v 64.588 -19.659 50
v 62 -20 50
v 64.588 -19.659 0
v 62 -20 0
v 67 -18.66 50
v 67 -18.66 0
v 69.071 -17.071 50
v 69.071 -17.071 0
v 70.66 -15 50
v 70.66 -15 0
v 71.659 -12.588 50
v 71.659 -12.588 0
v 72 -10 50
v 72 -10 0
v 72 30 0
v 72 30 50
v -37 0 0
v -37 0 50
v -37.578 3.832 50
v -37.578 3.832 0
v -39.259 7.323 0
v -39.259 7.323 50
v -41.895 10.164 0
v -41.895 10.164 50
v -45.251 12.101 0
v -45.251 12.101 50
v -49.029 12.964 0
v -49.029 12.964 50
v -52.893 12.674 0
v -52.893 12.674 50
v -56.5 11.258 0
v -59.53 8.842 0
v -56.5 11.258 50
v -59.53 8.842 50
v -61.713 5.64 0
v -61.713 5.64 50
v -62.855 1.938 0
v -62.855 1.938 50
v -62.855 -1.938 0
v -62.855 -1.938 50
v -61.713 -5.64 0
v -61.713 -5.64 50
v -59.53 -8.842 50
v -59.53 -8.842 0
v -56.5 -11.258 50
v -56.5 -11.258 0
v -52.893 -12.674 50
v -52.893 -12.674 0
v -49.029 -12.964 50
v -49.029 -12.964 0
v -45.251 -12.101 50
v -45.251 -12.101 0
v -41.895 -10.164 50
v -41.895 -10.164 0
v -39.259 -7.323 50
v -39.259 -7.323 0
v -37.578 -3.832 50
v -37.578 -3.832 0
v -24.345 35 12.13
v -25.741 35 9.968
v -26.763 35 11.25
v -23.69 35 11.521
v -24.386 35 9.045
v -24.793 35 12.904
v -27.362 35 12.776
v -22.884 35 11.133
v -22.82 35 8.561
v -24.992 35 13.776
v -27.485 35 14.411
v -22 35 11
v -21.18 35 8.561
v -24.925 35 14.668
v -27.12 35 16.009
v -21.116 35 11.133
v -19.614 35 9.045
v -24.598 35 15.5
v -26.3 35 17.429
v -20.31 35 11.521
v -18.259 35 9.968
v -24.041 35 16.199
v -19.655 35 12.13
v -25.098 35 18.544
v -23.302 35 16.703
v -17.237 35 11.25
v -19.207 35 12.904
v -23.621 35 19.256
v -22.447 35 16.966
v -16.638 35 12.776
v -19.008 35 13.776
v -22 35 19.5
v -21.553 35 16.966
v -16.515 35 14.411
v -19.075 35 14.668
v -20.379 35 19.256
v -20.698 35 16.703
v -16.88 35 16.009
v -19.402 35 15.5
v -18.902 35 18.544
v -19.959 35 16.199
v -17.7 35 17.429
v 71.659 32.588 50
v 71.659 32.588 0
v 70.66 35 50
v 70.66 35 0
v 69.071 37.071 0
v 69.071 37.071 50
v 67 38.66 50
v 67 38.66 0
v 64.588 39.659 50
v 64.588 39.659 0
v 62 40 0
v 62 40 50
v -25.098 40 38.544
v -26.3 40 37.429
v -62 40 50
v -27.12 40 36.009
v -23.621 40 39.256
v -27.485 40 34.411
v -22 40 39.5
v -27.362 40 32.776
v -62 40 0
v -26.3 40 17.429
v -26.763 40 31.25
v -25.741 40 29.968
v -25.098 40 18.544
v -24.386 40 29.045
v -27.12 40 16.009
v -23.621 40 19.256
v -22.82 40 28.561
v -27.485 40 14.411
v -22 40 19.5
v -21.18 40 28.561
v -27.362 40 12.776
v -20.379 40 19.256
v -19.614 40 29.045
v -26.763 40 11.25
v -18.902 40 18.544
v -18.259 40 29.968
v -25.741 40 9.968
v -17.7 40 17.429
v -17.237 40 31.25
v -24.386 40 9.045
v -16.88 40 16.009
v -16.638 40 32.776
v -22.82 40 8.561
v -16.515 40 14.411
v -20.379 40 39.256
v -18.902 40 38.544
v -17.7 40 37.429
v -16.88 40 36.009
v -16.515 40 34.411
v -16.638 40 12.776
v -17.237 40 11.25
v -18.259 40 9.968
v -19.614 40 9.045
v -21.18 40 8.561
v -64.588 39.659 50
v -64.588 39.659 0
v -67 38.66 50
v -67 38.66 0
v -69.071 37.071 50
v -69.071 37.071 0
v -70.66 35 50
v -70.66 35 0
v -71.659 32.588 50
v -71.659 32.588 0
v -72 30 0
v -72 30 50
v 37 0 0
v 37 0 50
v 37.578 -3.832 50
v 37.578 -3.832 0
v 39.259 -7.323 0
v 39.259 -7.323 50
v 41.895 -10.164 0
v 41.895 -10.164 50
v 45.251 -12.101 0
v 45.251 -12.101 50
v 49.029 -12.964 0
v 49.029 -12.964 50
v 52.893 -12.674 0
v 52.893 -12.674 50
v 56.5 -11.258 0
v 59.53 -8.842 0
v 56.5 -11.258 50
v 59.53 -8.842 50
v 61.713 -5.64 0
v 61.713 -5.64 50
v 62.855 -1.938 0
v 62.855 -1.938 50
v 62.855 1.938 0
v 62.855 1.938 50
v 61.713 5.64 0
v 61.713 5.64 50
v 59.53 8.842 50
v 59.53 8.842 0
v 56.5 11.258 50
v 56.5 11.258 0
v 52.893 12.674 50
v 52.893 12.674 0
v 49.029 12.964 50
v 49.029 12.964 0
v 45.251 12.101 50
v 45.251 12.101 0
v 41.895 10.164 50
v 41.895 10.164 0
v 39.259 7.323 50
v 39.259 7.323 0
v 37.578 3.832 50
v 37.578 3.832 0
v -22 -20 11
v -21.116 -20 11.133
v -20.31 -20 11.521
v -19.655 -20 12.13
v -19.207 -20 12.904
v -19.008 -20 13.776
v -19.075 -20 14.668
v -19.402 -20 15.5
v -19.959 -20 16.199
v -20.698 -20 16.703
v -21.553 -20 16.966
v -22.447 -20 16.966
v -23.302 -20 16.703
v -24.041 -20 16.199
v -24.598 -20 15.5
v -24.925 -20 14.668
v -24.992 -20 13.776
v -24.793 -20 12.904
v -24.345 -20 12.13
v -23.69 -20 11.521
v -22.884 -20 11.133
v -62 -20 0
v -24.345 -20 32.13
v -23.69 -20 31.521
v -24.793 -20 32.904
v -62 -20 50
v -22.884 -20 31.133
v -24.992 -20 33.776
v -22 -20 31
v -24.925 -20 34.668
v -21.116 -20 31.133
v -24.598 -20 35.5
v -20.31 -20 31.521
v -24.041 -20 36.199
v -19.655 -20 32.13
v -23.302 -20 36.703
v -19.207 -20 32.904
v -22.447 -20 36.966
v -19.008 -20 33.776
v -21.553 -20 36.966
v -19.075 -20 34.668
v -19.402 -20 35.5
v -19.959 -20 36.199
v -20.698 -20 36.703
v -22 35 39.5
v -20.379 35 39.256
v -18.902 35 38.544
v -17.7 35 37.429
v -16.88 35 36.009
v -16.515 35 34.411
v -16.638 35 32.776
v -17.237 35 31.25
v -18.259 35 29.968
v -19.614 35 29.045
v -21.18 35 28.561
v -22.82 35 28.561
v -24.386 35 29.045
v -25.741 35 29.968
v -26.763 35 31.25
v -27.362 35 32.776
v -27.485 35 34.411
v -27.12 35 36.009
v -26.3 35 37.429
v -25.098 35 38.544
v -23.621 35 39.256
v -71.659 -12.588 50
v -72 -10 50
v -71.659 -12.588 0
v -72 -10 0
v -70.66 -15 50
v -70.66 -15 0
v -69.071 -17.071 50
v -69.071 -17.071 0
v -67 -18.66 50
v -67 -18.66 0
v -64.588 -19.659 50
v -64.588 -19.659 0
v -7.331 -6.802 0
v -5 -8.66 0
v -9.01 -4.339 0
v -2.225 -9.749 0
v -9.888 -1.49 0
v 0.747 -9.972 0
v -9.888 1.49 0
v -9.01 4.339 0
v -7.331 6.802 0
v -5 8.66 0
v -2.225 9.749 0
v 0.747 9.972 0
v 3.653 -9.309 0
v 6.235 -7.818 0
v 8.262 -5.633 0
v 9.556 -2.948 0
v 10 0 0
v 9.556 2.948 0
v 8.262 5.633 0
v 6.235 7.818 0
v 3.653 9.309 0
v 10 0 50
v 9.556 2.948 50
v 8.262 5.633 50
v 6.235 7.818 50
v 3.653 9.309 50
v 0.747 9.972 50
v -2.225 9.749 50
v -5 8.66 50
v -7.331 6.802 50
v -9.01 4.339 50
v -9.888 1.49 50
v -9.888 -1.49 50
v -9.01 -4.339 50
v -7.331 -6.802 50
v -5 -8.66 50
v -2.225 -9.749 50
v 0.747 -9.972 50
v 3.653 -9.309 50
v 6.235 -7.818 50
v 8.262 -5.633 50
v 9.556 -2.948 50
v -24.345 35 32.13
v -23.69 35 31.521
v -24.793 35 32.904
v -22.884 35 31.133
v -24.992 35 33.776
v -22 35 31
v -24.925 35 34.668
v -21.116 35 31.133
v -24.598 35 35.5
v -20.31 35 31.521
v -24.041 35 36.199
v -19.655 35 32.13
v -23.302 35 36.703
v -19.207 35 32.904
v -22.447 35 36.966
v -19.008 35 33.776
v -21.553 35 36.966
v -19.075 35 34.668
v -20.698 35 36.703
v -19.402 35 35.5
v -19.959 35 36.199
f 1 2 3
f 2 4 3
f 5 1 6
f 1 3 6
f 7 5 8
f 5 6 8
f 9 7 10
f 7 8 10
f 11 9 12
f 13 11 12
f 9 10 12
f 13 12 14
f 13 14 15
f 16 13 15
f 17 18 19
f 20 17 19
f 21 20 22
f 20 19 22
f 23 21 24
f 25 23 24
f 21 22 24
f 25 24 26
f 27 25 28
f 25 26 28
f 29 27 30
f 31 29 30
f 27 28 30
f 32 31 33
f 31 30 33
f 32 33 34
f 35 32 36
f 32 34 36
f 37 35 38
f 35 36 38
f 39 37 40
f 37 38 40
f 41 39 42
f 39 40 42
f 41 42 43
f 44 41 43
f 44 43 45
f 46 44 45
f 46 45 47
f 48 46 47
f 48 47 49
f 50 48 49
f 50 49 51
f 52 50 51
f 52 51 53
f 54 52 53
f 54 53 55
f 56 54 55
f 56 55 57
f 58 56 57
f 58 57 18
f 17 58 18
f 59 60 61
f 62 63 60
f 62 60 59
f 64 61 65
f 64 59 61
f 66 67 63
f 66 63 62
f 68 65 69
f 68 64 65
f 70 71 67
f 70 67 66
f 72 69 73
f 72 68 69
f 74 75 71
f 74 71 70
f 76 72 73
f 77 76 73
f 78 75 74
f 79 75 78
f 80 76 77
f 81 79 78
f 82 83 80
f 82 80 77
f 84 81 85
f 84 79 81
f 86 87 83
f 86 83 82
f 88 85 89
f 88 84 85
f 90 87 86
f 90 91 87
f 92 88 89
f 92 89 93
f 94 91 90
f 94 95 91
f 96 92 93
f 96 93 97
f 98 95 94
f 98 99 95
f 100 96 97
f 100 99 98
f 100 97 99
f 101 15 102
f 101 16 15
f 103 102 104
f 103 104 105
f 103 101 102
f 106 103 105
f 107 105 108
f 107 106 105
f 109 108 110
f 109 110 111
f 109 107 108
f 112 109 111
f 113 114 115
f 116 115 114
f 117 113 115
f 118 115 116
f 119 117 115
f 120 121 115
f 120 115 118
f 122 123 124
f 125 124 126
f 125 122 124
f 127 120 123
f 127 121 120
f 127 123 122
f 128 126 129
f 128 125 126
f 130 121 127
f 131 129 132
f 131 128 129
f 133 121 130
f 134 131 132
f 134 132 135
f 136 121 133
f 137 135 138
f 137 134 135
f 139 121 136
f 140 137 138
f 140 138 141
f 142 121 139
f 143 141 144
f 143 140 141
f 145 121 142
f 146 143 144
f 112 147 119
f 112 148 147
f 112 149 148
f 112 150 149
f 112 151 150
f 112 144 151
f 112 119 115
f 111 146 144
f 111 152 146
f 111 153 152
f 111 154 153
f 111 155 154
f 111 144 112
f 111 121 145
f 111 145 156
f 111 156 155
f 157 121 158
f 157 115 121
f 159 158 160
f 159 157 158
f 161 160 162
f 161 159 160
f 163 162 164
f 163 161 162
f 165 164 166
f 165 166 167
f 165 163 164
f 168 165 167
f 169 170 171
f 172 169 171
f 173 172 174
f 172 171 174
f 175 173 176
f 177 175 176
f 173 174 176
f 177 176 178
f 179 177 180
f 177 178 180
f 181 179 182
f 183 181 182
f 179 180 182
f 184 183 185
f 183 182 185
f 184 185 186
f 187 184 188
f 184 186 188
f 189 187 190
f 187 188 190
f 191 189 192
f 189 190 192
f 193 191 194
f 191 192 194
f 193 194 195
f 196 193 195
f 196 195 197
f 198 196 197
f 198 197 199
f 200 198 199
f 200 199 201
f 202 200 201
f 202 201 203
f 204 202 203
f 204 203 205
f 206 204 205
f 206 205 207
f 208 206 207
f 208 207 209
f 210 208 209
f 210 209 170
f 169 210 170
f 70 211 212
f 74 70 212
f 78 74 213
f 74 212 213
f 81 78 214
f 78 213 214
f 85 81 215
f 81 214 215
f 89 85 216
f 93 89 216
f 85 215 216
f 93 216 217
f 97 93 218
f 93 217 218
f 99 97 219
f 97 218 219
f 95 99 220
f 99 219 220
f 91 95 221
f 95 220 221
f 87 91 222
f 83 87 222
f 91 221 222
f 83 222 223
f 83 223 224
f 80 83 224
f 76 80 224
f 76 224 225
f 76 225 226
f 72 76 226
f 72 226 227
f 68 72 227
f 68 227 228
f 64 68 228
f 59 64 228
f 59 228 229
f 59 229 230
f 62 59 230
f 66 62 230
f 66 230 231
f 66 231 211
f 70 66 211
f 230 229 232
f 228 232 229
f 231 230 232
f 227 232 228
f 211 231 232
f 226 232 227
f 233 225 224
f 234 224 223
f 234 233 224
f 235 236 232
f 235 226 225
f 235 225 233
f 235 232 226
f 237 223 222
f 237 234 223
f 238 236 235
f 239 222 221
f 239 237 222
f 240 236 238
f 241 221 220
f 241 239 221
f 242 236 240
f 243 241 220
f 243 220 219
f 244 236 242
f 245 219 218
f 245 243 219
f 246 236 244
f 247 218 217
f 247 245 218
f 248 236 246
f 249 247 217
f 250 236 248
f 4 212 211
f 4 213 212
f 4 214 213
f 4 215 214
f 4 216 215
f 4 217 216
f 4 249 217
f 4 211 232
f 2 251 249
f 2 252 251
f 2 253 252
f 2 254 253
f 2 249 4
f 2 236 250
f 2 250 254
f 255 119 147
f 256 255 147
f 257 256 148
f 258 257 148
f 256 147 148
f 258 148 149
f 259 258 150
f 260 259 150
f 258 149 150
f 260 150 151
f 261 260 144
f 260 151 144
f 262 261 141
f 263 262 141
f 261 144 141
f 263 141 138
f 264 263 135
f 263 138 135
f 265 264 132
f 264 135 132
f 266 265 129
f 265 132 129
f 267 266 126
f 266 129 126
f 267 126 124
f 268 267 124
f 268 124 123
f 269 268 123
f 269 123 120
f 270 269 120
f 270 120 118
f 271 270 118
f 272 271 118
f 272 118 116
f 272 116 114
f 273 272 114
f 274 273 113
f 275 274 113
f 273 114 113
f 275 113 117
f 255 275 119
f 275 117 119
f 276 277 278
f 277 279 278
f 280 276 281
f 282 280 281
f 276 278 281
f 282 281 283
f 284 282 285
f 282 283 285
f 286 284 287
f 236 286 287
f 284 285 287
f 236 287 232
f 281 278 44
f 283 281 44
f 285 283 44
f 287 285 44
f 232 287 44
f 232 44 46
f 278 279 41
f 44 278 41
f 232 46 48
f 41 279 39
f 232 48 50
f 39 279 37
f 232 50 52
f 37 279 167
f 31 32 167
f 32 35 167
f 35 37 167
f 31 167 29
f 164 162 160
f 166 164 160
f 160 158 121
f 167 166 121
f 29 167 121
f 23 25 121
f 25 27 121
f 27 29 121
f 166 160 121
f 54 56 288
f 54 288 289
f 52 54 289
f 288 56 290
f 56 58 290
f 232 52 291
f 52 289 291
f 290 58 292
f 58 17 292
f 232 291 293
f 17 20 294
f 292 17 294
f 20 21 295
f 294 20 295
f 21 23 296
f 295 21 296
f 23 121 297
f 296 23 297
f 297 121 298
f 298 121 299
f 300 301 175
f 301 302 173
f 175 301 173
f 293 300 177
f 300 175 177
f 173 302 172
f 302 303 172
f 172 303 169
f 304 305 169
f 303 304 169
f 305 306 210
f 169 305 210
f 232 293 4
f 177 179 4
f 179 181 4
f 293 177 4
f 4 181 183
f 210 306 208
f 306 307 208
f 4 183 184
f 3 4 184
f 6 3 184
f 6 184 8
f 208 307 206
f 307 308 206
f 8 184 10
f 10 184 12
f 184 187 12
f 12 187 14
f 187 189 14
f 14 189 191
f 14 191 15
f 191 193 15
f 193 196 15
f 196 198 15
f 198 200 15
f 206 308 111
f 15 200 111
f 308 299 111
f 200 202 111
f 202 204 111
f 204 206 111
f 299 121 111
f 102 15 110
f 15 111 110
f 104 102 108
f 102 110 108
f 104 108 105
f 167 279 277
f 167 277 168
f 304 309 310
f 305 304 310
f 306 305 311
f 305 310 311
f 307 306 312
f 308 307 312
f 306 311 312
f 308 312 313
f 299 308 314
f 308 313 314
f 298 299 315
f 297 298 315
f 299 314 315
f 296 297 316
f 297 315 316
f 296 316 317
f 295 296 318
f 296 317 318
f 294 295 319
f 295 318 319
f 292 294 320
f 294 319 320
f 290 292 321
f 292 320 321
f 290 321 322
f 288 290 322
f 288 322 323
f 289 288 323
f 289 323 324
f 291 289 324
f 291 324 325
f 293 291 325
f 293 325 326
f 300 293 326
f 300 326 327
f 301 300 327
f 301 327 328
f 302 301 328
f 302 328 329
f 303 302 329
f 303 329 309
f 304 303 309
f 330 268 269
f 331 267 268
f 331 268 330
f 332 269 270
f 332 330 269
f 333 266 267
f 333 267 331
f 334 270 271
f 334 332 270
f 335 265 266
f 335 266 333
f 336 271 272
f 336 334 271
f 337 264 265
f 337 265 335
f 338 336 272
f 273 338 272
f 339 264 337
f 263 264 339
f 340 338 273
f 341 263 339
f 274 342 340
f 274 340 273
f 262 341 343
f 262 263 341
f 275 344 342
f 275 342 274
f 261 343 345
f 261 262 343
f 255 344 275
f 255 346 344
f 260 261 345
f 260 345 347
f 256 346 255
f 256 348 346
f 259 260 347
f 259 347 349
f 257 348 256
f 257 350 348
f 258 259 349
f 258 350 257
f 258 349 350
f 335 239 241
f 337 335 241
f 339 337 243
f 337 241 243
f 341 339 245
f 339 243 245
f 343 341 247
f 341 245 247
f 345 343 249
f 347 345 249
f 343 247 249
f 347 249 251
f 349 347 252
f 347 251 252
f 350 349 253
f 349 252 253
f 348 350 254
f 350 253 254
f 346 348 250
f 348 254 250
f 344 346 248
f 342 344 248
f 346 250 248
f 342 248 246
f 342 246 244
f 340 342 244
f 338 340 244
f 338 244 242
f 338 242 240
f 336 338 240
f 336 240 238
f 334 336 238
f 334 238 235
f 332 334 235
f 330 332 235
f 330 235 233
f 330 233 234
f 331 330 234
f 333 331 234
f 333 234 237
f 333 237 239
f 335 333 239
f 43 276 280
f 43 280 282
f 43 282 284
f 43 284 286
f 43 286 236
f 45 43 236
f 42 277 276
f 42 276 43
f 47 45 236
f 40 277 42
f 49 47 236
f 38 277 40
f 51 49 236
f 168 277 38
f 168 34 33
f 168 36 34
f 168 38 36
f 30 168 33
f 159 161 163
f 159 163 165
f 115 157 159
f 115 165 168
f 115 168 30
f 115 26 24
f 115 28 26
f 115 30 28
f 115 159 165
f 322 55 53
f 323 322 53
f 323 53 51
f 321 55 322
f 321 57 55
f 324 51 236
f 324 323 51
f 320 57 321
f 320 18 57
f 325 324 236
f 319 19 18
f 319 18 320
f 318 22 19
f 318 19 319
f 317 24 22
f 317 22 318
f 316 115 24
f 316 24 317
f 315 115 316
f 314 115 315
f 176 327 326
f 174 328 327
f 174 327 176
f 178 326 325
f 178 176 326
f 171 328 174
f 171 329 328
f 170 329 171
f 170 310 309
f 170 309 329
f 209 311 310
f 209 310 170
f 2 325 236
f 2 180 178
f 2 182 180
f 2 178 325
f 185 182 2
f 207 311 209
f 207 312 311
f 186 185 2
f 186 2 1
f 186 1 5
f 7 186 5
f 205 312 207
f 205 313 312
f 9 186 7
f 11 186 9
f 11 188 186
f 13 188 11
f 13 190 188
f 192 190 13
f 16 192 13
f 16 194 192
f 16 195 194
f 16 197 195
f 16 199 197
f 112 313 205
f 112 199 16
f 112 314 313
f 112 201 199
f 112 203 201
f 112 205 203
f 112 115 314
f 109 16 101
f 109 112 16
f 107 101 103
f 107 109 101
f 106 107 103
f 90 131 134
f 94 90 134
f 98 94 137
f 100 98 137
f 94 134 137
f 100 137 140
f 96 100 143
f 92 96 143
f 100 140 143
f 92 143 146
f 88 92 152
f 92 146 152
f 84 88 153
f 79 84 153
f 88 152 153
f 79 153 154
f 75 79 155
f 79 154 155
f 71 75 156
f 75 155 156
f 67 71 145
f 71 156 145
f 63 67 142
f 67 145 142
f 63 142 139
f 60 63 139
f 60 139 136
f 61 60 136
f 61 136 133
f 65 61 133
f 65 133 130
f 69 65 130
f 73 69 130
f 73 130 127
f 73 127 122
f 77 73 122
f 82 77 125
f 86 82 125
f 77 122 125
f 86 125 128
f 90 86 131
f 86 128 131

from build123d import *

# Parameters (mm, degrees)
SKETCH1_W           = 144
SKETCH1_H           = 80
BOSS_EXTRUDE1_DEPTH = 50
CUT_EXTRUDE1_REACH  = 98.354
SKETCH2_R           = 10
SKETCH2_R_2         = 13
CUT_EXTRUDE3_REACH  = 98.354
SKETCH3_W           = 144
SKETCH3_H           = 20
CUT_EXTRUDE4_REACH  = 108.226
SKETCH5_R           = 3
FILLET1_R           = 10
FILLET2_R           = 10
FILLET3_R           = 10
FILLET4_R           = 10
SKETCH6_R           = 5.5
CUT_EXTRUDE5_DEPTH  = 5


with BuildPart() as part:
    # Sketch1 → Boss-Extrude1 (new body)
    with BuildSketch(Plane.XY):
        Rectangle(SKETCH1_W, SKETCH1_H)
    extrude(amount=BOSS_EXTRUDE1_DEPTH)

    # Sketch2 → Cut-Extrude1 (cut, up to next)
    with BuildSketch(Plane.XY.offset(50), mode=Mode.PRIVATE) as cut_extrude1_sk1:
        Circle(SKETCH2_R)
    cut_extrude1_tool1 = extrude(cut_extrude1_sk1.sketch, amount=-CUT_EXTRUDE1_REACH, mode=Mode.PRIVATE) & part.part
    # Sketch2 → Cut-Extrude1 (cut, up to next)
    with BuildSketch(Plane.XY.offset(50), mode=Mode.PRIVATE) as cut_extrude1_sk2:
        with Locations((-50, 0)):
            Circle(SKETCH2_R_2)
    cut_extrude1_tool2 = extrude(cut_extrude1_sk2.sketch, amount=-CUT_EXTRUDE1_REACH, mode=Mode.PRIVATE) & part.part
    # Sketch2 → Cut-Extrude1 (cut, up to next)
    with BuildSketch(Plane.XY.offset(50), mode=Mode.PRIVATE) as cut_extrude1_sk3:
        with Locations(Location((50, 0, 0), (0, 0, 180))):
            Circle(SKETCH2_R_2)
    cut_extrude1_tool3 = extrude(cut_extrude1_sk3.sketch, amount=-CUT_EXTRUDE1_REACH, mode=Mode.PRIVATE) & part.part
    add(cut_extrude1_tool1.solids().sort_by_distance((0, 0, 50))[0], mode=Mode.SUBTRACT)
    add(cut_extrude1_tool2.solids().sort_by_distance((-50, 0, 50))[0], mode=Mode.SUBTRACT)
    add(cut_extrude1_tool3.solids().sort_by_distance((50, 0, 50))[0], mode=Mode.SUBTRACT)

    # Sketch3 → Cut-Extrude3 (cut, up to next)
    with BuildSketch(Plane.XY.offset(50), mode=Mode.PRIVATE) as cut_extrude3_sk1:
        with Locations((0, -30)):
            Rectangle(SKETCH3_W, SKETCH3_H)
    cut_extrude3_tool1 = extrude(cut_extrude3_sk1.sketch, amount=-CUT_EXTRUDE3_REACH, mode=Mode.PRIVATE) & part.part
    add(cut_extrude3_tool1.solids().sort_by_distance((0, -30, 50))[0], mode=Mode.SUBTRACT)

    # Sketch5 → Cut-Extrude4 (cut, up to next)
    with BuildSketch(Plane.XZ.offset(20), mode=Mode.PRIVATE) as cut_extrude4_sk1:
        with Locations(Location((-22, 34, 0), (0, 0, 270))):
            Circle(SKETCH5_R)
    cut_extrude4_tool1 = extrude(cut_extrude4_sk1.sketch, amount=-CUT_EXTRUDE4_REACH, mode=Mode.PRIVATE) & part.part
    # Sketch5 → Cut-Extrude4 (cut, up to next)
    with BuildSketch(Plane.XZ.offset(20), mode=Mode.PRIVATE) as cut_extrude4_sk2:
        with Locations(Location((-22, 14, 0), (0, 0, 270))):
            Circle(SKETCH5_R)
    cut_extrude4_tool2 = extrude(cut_extrude4_sk2.sketch, amount=-CUT_EXTRUDE4_REACH, mode=Mode.PRIVATE) & part.part
    add(cut_extrude4_tool1.solids().sort_by_distance((-22, -20, 34))[0], mode=Mode.SUBTRACT)
    add(cut_extrude4_tool2.solids().sort_by_distance((-22, -20, 14))[0], mode=Mode.SUBTRACT)

    # Fillet1
    fillet1_edges = [part.edges().sort_by_distance(p)[0] for p in [
        (72, -20, 25),
    ]]
    fillet(fillet1_edges, radius=FILLET1_R)

    # Fillet2
    fillet2_edges = [part.edges().sort_by_distance(p)[0] for p in [
        (72, 40, 25),
    ]]
    fillet(fillet2_edges, radius=FILLET2_R)

    # Fillet3
    fillet3_edges = [part.edges().sort_by_distance(p)[0] for p in [
        (-72, 40, 25),
    ]]
    fillet(fillet3_edges, radius=FILLET3_R)

    # Fillet4
    fillet4_edges = [part.edges().sort_by_distance(p)[0] for p in [
        (-72, -20, 25),
    ]]
    fillet(fillet4_edges, radius=FILLET4_R)

    # Sketch6 → Cut-Extrude5 (cut)
    with BuildSketch(Plane(origin=(0, 40, 0), x_dir=(1, 0, 0), z_dir=(0, 1, 0))):
        with Locations(Location((-22, -14, 0), (0, 0, 270))):
            Circle(SKETCH6_R)
        with Locations(Location((-22, -34, 0), (0, 0, 270))):
            Circle(SKETCH6_R)
    extrude(amount=-CUT_EXTRUDE5_DEPTH, mode=Mode.SUBTRACT)


solid = part.part
